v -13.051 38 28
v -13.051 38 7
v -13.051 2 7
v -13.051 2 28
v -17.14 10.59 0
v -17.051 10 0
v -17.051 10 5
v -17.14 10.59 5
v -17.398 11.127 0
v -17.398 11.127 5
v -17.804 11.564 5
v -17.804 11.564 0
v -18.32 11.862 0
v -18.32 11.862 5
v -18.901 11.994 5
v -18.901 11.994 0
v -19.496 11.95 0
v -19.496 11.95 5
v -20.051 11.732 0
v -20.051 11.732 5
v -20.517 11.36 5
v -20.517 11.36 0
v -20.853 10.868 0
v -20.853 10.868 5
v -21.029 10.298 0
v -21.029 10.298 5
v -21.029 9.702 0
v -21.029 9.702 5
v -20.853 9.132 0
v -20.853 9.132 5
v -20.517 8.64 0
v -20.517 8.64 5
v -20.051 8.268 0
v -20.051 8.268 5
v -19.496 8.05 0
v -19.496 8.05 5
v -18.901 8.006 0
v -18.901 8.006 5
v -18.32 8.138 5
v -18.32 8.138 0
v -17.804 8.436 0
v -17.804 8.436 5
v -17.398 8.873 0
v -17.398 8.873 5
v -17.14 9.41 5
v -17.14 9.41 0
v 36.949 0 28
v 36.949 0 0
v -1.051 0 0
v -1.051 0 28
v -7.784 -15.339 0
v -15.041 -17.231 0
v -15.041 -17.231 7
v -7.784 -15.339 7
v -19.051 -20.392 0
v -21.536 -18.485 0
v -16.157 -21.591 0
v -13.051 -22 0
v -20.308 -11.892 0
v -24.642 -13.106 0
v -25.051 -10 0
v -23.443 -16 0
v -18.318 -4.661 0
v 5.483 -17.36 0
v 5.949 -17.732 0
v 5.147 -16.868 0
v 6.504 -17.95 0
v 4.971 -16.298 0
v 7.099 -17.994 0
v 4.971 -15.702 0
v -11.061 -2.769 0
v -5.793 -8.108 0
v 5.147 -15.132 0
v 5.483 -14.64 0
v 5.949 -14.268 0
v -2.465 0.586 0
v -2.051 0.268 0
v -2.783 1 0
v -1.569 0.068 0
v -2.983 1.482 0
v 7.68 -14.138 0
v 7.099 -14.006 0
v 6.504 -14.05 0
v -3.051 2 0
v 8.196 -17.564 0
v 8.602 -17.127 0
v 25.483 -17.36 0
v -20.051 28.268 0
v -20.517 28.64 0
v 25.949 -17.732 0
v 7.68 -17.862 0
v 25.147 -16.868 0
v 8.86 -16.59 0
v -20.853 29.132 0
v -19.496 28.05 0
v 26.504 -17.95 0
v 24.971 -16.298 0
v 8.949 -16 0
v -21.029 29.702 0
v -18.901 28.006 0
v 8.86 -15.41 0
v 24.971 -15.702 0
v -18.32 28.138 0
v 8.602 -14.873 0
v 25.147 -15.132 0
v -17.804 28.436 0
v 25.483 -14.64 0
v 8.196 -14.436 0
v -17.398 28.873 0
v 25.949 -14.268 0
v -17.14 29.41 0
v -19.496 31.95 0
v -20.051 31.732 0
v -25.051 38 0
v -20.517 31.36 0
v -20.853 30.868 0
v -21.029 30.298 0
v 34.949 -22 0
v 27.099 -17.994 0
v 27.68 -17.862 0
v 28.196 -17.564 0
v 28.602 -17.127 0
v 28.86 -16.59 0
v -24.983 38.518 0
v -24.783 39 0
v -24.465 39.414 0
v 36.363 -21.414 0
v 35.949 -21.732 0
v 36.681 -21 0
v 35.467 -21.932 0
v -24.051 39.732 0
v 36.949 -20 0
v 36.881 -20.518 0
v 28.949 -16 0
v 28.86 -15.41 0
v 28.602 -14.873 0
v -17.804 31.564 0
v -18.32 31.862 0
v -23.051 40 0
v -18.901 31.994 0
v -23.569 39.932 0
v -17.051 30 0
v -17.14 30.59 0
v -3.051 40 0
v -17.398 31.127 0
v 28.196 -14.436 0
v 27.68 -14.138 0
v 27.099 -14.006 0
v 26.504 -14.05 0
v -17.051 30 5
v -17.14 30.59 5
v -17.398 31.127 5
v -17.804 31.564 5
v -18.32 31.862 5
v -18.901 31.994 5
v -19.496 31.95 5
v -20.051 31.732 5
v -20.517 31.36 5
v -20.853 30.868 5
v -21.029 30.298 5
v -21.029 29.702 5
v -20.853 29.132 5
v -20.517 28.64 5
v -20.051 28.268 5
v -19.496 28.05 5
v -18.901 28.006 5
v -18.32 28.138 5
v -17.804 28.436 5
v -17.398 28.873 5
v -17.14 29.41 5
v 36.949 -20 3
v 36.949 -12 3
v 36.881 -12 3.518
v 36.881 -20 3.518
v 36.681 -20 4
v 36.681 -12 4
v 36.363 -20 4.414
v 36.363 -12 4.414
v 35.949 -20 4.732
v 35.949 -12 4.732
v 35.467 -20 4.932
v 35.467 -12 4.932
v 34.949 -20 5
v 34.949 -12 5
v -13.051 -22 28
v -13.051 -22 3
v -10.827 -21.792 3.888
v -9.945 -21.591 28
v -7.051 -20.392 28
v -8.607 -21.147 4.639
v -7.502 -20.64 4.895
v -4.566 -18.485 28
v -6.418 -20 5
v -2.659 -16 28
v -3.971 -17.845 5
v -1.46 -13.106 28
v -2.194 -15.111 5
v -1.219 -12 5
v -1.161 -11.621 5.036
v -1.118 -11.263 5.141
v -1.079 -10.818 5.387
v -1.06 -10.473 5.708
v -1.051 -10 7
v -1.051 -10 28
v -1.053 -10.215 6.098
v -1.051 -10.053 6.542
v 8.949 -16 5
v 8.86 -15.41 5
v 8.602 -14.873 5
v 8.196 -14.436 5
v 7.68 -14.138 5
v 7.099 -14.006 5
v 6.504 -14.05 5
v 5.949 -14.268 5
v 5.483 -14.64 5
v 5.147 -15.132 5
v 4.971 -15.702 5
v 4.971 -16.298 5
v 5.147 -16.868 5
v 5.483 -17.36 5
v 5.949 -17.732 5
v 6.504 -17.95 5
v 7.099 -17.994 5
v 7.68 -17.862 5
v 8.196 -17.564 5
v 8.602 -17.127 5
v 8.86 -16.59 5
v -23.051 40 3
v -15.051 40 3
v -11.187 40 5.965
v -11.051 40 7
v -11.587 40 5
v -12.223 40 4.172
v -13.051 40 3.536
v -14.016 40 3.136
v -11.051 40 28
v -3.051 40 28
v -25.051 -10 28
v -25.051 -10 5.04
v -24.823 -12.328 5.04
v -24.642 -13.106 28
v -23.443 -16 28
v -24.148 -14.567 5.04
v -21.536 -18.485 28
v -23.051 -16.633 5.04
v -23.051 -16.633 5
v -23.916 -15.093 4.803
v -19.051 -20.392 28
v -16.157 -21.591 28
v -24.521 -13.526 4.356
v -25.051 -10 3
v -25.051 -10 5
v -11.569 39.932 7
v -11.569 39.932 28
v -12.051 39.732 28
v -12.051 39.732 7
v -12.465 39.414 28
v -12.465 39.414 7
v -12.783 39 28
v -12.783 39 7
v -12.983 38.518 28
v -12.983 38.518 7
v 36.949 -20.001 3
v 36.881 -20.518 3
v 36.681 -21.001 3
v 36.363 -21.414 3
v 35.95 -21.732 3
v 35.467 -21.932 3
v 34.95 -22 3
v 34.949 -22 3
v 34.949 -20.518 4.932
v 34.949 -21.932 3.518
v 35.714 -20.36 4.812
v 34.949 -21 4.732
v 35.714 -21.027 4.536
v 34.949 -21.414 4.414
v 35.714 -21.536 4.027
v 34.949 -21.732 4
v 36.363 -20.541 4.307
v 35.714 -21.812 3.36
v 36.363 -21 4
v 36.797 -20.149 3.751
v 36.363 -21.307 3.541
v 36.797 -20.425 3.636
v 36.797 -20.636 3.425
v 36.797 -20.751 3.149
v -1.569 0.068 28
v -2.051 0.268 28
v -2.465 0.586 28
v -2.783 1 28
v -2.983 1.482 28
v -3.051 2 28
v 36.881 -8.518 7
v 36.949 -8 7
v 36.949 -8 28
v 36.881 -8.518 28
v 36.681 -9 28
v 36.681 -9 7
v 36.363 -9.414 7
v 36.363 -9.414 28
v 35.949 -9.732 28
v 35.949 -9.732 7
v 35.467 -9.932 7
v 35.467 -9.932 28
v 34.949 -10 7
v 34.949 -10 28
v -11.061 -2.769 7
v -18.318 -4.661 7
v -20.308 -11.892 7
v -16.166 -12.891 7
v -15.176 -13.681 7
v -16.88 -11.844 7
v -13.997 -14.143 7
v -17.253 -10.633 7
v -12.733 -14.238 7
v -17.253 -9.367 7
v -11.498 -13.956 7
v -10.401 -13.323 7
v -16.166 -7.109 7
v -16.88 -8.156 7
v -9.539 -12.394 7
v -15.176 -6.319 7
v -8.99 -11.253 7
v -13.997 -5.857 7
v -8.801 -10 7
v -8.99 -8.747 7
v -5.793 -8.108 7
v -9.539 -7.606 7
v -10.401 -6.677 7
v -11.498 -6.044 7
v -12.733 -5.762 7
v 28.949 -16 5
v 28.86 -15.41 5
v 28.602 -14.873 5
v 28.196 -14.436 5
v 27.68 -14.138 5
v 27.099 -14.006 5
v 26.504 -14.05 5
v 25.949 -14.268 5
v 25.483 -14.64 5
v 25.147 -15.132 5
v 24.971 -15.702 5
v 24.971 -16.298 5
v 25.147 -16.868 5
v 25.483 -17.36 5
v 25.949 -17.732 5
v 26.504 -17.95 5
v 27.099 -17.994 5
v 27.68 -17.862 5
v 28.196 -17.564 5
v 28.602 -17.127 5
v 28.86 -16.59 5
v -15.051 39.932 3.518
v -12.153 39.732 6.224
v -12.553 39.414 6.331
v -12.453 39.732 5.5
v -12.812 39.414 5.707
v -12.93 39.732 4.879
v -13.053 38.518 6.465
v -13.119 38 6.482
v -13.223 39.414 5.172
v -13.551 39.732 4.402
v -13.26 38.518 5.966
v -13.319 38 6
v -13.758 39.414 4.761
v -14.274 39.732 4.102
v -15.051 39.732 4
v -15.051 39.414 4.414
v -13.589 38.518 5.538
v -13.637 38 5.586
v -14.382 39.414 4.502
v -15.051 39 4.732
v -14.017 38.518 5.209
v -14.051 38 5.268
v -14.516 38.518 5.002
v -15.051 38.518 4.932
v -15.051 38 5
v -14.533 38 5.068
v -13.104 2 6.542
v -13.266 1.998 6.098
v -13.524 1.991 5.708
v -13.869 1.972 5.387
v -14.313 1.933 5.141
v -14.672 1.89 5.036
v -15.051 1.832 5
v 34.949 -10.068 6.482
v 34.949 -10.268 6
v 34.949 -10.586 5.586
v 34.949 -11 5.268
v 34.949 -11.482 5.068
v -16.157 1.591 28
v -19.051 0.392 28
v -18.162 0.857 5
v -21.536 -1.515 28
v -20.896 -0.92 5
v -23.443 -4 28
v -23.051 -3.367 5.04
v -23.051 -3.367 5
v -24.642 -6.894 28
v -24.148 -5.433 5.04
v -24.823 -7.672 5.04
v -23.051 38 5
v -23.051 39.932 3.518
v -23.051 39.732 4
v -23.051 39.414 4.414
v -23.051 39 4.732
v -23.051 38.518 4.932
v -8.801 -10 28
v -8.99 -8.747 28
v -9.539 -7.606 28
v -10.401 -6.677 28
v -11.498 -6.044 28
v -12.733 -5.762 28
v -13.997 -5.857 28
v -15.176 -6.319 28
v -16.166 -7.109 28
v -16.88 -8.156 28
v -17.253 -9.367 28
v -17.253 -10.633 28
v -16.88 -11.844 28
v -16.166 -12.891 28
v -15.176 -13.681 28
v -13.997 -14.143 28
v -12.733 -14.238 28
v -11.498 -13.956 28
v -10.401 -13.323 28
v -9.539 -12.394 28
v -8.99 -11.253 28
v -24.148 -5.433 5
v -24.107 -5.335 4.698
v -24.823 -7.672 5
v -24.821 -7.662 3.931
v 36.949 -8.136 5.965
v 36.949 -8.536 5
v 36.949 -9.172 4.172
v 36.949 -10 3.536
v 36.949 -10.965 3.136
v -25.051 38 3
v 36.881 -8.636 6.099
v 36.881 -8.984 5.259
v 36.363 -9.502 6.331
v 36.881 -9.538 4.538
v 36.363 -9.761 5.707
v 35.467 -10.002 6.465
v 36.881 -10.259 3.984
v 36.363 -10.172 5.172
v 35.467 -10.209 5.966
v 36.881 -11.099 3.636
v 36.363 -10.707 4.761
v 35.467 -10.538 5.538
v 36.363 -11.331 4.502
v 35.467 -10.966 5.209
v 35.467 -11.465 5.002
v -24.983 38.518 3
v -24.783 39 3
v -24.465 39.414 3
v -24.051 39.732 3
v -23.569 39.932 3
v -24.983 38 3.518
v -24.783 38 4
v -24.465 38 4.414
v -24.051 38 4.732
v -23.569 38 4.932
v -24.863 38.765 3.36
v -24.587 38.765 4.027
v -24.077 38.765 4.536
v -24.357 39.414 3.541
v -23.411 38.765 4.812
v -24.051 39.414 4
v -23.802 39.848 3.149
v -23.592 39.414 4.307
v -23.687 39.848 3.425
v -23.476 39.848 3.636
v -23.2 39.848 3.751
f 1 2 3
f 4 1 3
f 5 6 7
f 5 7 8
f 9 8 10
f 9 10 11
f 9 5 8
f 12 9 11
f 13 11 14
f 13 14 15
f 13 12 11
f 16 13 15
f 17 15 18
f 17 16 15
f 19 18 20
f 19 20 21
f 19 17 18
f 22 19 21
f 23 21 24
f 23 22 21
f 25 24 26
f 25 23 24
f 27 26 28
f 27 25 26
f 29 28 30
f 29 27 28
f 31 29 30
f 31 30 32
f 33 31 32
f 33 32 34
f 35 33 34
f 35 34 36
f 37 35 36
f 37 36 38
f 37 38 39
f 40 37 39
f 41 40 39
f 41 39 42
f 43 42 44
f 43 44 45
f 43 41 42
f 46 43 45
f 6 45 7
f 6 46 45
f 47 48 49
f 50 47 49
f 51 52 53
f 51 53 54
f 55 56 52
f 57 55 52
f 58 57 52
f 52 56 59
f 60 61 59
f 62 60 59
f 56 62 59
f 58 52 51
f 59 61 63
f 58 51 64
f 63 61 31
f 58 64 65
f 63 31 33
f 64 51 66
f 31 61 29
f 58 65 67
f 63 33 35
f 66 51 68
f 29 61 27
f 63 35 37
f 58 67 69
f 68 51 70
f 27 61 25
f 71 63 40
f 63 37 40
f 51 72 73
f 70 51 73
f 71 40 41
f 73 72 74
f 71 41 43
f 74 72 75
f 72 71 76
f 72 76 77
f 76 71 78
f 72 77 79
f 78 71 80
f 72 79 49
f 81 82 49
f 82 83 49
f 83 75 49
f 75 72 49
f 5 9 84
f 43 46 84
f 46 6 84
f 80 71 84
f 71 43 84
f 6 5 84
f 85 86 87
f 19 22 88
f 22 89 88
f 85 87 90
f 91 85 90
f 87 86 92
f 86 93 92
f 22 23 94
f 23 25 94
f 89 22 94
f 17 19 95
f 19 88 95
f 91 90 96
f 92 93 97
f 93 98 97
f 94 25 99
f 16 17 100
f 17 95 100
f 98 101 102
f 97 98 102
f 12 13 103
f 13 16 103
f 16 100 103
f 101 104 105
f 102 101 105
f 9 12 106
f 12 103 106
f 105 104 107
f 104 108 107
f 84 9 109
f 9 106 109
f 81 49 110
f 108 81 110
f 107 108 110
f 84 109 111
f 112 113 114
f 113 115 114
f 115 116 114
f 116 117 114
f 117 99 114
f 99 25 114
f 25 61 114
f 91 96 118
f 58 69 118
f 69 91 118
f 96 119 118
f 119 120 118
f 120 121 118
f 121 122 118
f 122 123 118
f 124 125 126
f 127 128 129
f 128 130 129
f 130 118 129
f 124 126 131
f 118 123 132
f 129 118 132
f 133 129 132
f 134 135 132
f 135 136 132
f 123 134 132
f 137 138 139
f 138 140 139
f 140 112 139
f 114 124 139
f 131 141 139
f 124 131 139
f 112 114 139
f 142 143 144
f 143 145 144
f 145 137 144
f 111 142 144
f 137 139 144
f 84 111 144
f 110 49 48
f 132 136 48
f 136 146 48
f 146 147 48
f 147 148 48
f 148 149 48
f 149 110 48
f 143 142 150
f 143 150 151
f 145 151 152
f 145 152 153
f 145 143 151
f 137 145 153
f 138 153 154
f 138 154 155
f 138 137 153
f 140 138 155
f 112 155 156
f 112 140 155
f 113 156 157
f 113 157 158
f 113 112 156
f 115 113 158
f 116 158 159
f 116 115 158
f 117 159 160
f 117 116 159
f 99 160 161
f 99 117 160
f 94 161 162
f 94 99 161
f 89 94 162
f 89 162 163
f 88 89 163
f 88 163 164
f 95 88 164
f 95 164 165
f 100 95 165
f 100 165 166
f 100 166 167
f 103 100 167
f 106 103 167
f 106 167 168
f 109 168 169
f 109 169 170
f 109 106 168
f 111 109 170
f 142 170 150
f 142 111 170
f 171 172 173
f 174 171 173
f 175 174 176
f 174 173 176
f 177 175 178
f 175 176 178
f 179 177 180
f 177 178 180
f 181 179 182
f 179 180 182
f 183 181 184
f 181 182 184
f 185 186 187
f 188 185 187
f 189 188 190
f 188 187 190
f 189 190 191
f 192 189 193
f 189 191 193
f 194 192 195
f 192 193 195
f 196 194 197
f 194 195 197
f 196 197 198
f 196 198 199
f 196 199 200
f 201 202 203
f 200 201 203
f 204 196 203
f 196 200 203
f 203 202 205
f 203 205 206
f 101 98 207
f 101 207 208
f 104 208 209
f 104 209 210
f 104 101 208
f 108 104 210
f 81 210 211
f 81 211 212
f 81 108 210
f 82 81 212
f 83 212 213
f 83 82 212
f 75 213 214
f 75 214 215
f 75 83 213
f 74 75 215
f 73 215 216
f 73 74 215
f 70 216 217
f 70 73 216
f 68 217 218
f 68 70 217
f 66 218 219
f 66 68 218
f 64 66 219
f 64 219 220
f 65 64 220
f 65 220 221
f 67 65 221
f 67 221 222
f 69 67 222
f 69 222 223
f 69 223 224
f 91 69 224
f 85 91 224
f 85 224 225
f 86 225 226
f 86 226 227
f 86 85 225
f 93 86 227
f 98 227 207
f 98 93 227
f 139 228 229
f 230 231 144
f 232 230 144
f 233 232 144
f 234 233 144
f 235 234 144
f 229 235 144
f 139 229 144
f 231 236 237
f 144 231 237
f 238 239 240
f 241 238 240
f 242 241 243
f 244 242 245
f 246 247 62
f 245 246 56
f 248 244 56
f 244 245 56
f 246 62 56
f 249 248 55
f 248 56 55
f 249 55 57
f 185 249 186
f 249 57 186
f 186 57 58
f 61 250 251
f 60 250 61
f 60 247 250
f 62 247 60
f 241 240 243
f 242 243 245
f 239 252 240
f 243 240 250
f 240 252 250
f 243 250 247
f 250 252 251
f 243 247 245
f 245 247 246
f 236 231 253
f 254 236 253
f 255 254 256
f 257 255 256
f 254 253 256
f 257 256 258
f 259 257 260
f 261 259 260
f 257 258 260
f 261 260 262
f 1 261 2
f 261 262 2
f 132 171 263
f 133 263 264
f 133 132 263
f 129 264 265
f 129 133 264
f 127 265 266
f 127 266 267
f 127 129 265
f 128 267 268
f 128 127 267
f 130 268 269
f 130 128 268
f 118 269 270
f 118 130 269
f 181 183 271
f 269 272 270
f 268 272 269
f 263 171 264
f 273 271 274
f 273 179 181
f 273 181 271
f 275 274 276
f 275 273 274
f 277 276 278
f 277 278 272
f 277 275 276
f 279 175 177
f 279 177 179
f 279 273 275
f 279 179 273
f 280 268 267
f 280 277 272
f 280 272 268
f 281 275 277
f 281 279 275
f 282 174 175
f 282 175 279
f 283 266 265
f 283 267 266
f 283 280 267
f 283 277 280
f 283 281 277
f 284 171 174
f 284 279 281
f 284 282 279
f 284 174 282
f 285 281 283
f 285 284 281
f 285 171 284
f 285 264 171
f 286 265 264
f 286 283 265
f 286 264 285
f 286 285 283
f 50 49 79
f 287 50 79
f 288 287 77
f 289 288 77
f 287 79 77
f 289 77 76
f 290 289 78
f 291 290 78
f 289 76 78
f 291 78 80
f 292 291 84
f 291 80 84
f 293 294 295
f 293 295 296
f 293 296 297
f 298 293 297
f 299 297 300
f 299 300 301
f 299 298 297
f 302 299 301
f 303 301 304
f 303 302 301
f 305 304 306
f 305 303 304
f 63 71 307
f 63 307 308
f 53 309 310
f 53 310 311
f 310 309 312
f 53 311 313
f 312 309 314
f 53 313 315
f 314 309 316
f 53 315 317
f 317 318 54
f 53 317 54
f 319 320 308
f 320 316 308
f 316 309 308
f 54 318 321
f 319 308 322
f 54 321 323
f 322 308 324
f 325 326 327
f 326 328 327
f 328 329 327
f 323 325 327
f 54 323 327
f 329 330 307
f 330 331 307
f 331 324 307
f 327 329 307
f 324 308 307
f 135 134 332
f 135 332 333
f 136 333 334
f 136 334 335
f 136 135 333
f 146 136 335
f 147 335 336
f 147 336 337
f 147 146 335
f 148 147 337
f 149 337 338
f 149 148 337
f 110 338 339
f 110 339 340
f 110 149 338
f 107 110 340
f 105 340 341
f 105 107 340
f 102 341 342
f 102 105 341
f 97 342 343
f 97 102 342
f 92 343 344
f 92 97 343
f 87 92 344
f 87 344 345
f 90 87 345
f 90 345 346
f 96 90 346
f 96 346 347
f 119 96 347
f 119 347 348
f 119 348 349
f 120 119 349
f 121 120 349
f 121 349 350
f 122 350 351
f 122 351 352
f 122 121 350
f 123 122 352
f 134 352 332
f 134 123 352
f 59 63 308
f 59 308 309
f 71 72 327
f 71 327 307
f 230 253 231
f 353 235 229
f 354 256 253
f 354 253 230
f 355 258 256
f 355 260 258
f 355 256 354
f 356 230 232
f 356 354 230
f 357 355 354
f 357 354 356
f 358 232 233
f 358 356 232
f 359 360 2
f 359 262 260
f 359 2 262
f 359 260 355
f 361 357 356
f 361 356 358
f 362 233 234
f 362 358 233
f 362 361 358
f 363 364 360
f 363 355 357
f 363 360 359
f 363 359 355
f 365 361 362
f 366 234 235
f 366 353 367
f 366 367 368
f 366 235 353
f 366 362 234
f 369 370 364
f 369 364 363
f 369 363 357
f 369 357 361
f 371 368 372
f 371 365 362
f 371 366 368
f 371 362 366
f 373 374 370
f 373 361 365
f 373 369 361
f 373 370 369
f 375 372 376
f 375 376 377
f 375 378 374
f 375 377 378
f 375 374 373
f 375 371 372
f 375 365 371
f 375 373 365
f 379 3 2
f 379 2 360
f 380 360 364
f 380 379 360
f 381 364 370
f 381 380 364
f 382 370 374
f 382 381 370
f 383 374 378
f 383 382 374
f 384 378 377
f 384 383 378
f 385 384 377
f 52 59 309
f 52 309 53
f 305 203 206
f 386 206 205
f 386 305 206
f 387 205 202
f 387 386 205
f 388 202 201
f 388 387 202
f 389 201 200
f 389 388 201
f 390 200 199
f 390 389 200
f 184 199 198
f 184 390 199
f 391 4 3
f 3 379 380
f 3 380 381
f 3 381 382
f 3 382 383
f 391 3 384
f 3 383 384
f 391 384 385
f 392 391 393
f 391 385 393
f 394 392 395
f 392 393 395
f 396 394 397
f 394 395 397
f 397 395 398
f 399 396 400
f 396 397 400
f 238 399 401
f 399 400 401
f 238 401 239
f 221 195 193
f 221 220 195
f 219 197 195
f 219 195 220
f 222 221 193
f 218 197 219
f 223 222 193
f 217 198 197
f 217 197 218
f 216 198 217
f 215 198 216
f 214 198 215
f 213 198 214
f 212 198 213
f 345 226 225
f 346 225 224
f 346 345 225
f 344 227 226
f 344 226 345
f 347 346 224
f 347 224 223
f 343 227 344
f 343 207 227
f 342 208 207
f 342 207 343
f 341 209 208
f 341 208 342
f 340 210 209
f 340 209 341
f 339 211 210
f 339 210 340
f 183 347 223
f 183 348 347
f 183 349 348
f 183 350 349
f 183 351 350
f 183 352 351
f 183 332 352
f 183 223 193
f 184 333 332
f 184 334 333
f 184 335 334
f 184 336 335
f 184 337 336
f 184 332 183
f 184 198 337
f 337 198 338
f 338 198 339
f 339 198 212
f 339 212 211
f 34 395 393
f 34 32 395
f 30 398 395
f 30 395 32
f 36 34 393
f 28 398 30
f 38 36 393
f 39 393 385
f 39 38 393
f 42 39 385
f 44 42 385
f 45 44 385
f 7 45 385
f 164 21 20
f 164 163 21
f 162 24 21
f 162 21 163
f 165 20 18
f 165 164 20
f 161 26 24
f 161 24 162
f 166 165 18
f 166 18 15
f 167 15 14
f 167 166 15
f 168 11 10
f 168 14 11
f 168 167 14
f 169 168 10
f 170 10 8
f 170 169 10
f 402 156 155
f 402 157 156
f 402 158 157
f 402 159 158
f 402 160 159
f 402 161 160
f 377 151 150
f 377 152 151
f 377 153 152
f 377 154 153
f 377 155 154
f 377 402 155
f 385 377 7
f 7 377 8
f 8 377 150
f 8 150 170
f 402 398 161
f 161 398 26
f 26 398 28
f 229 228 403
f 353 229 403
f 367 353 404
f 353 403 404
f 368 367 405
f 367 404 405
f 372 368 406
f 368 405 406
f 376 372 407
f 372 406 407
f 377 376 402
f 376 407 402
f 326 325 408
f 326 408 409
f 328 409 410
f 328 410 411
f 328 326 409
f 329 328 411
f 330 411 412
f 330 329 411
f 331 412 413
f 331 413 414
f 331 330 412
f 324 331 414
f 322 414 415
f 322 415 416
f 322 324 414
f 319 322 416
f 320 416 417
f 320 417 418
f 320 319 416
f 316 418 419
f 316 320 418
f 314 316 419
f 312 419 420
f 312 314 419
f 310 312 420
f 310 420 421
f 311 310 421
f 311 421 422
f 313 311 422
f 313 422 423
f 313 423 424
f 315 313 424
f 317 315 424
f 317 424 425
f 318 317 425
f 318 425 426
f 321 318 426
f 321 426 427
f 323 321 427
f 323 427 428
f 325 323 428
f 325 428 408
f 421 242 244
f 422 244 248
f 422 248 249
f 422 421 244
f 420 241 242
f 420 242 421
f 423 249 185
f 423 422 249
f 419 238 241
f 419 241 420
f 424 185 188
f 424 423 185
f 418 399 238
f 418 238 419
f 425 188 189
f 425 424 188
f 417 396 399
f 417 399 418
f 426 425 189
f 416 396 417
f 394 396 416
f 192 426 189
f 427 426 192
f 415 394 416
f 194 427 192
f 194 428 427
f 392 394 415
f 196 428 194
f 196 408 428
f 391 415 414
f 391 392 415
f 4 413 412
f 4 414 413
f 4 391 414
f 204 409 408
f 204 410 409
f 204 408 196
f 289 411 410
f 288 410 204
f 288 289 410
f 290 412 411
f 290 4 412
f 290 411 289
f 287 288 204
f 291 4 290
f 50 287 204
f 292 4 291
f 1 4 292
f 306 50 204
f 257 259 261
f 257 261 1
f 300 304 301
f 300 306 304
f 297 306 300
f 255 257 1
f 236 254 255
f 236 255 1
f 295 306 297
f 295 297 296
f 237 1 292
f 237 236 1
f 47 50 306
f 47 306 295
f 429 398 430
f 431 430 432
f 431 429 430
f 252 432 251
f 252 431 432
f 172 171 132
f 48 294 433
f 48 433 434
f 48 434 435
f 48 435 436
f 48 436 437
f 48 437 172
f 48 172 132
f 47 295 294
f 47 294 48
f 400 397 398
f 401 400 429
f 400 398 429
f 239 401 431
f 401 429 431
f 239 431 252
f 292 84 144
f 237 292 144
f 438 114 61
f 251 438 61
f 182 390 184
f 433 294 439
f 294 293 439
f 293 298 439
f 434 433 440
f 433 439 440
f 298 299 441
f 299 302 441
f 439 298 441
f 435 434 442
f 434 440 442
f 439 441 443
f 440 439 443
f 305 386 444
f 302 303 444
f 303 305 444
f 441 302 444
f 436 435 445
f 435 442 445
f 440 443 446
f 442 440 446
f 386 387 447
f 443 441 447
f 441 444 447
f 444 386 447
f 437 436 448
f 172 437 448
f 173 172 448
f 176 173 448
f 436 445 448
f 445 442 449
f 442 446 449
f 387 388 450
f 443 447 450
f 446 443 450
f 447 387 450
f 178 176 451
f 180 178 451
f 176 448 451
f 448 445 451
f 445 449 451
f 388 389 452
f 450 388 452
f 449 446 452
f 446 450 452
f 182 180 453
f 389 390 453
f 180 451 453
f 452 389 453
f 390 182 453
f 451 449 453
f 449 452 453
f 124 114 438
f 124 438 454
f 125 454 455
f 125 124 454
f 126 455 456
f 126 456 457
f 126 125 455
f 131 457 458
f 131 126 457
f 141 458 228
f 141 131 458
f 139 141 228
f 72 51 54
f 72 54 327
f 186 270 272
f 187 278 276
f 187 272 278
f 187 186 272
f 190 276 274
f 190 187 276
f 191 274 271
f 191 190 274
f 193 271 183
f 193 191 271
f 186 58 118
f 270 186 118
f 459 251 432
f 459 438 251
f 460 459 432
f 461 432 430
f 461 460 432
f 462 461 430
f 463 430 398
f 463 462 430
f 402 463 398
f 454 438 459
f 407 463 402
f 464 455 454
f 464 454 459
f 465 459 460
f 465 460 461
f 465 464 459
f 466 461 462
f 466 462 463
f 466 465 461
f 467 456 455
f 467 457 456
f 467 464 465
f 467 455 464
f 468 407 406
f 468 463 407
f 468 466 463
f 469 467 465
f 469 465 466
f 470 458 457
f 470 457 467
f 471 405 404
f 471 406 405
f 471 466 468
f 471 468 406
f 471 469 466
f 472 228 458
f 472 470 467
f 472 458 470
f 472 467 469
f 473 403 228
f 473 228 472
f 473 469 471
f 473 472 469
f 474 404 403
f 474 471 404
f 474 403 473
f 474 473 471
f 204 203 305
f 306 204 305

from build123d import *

# Parameters (mm, degrees)
F1_DEPTH     = 28
F0_R         = 2
F2_DEPTH     = 5
F3_DEPTH     = 5
F0_R_2       = 4.25
F4_DEPTH     = 28
F5_DEPTH     = 7
F6_T1_DEPTH  = 28
F6_T6_DEPTH  = 43
F6_S7_R      = 12
F6_T8_DEPTH  = 23
F6_T12_DEPTH = 43
F6_S13_R     = 12
F6_T14_DEPTH = 23
F6_T15_DEPTH = 5
F6_T20_DEPTH = 58.5
F6_S21_R     = 12
F6_T22_DEPTH = 31
F6_T26_DEPTH = 58.5
F6_S27_R     = 12
F6_T28_DEPTH = 31
F6_T33_DEPTH = 10
F6_T37_DEPTH = 63.5
F6_T44_DEPTH = 10
F6_T48_DEPTH = 63.5
F6_T51_DEPTH = 21
F6_T53_DEPTH = 8
F6_T55_DEPTH = 8
F6_S59_W     = 2.04
F6_S59_H     = 2.04
F6_T60_DEPTH = 2.04
F6_S65_W     = 2.04
F6_S65_H     = 2.04
F6_T66_DEPTH = 2.04
F6_T70_ANGLE = 90
F6_T72_ANGLE = 90


# Not quite as in the source:
# - a fillet or chamfer that OpenCascade refuses, or shapes differently, is made with other operations: its cross-section is extruded or revolved along the edge and cut away or added


with BuildPart() as f1:
    # F0 (on Top) → F1 (new body)
    with BuildSketch(Plane.XY):
        with BuildLine():
            Line((36.9490647506, 0), (-3.0509352494, 0))
            Line((-3.0509352494, 0), (-3.0509352494, 40))
            Line((-3.0509352494, 40), (-13.0509352494, 40))
            Line((-13.0509352494, 40), (-13.0509352494, 2))
            ThreePointArc((-13.0509352494, 2), (-21.5362166237, -1.5147186258), (-25.0509352494, -10))
            ThreePointArc((-25.0509352494, -10), (-21.5362166237, -18.4852813742), (-13.0509352494, -22))
            ThreePointArc((-13.0509352494, -22), (-4.5656538752, -18.4852813742), (-1.0509352494, -10))
            Line((-1.0509352494, -10), (36.9490647506, -10))
            Line((36.9490647506, -10), (36.9490647506, 0))
        make_face()
        Polygon((-5.7934883103, -8.1080528744), (-7.7837375065, -15.3391598531), (-15.0411844456, -17.2311069787), (-20.3083821886, -11.8919471256), (-18.3181329923, -4.6608401469), (-11.0606860532, -2.7688930213), align=None, mode=Mode.SUBTRACT)
    extrude(amount=F1_DEPTH)

    # F0 (on Top) → F2 (join)
    with BuildSketch(Plane.XY):
        with BuildLine():
            Line((-13.0509352494, 2), (-13.0509352494, 40))
            Line((-13.0509352494, 40), (-25.0509352494, 40))
            Line((-25.0509352494, 40), (-25.0509352494, -10))
            ThreePointArc((-25.0509352494, -10), (-21.5362166237, -1.5147186258), (-13.0509352494, 2))
        make_face()
        with Locations((-19.0509352494, 10)):
            Circle(F0_R, mode=Mode.SUBTRACT)
        with Locations((-19.0509352494, 30)):
            Circle(F0_R, mode=Mode.SUBTRACT)
    extrude(amount=F2_DEPTH)

    # F0 (on Top) → F3 (join)
    with BuildSketch(Plane.XY):
        with BuildLine():
            Line((36.9490647506, -22), (36.9490647506, -10))
            Line((36.9490647506, -10), (-1.0509352494, -10))
            ThreePointArc((-1.0509352494, -10), (-4.5656538752, -18.4852813742), (-13.0509352494, -22))
            Line((-13.0509352494, -22), (36.9490647506, -22))
        make_face()
        with Locations((6.9490647506, -16)):
            Circle(F0_R, mode=Mode.SUBTRACT)
        with Locations((26.9490647506, -16)):
            Circle(F0_R, mode=Mode.SUBTRACT)
    extrude(amount=F3_DEPTH)

    # F0 (on Top) → F4 (join)
    with BuildSketch(Plane.XY):
        Polygon((-15.0411844456, -17.2311069787), (-7.7837375065, -15.3391598531), (-5.7934883103, -8.1080528744), (-11.0606860532, -2.7688930213), (-18.3181329923, -4.6608401469), (-20.3083821886, -11.8919471256), align=None)
        with Locations((-13.0509352494, -10)):
            Circle(F0_R_2, mode=Mode.SUBTRACT)
    extrude(amount=F4_DEPTH)

    # F0 (on Top) → F5 (cut)
    with BuildSketch(Plane.XY):
        Polygon((-15.0411844456, -17.2311069787), (-7.7837375065, -15.3391598531), (-5.7934883103, -8.1080528744), (-11.0606860532, -2.7688930213), (-18.3181329923, -4.6608401469), (-20.3083821886, -11.8919471256), align=None)
        with Locations((-13.0509352494, -10)):
            Circle(F0_R_2, mode=Mode.SUBTRACT)
    extrude(amount=F5_DEPTH, mode=Mode.SUBTRACT)

    # F6: fillet of radius 2 on 11 edges, made by hand

    # F6_s2 → F6_t1 (join)
    with BuildSketch(Plane.XY):
        with BuildLine():
            ThreePointArc((-1.0509352494, 0), (-2.4651488118, 0.5857864376), (-3.0509352494, 2))
            Line((-3.0509352494, 2), (-3.0909352494, 2))
            Line((-3.0909352494, 2), (-3.0909352494, -0.04))
            Line((-3.0909352494, -0.04), (-1.0509352494, -0.04))
            Line((-1.0509352494, -0.04), (-1.0509352494, 0))
        make_face()
    extrude(amount=F6_T1_DEPTH)


with BuildPart() as f6_tool4:
    # F6_s5 → F6_t6 (new body)
    with BuildSketch(Plane.YZ.offset(36.9490647506)):
        with BuildLine():
            ThreePointArc((-10, 7), (-10.5857864376, 5.5857864376), (-12, 5))
            Line((-12, 5), (-12, 4.96))
            Line((-12, 4.96), (-9.96, 4.96))
            Line((-9.96, 4.96), (-9.96, 7))
            Line((-9.96, 7), (-10, 7))
        make_face()
    extrude(amount=-F6_T6_DEPTH)

    # F6_s7 → F6_t8 (cut, symmetric)
    with BuildSketch(Plane.XY.offset(6)):
        with Locations((-13.0509352494, -10)):
            Circle(F6_S7_R)
    extrude(amount=F6_T8_DEPTH, both=True, mode=Mode.SUBTRACT)


with BuildPart() as f1_1:
    add(f1.part)

    # F6_t3: union F6_tool4
    add(f6_tool4.part)


with BuildPart() as f6_tool10:
    # F6_s11 → F6_t12 (new body)
    with BuildSketch(Plane.XZ.offset(3)):
        with BuildLine():
            ThreePointArc((-13.0509352494, 7), (-13.6367216871, 5.5857864376), (-15.0509352494, 5))
            Line((-15.0509352494, 5), (-15.0509352494, 4.96))
            Line((-15.0509352494, 4.96), (-13.0109352494, 4.96))
            Line((-13.0109352494, 4.96), (-13.0109352494, 7))
            Line((-13.0109352494, 7), (-13.0509352494, 7))
        make_face()
    extrude(amount=-F6_T12_DEPTH)

    # F6_s13 → F6_t14 (cut, symmetric)
    with BuildSketch(Plane.XY.offset(6)):
        with Locations((-13.0509352494, -10)):
            Circle(F6_S13_R)
    extrude(amount=F6_T14_DEPTH, both=True, mode=Mode.SUBTRACT)


with BuildPart() as f1_2:
    add(f1_1.part)

    # F6_t9: union F6_tool10
    add(f6_tool10.part)

    # F6_s16 → F6_t15 (cut)
    with BuildSketch(Plane.XY):
        with BuildLine():
            ThreePointArc((36.9490647506, -20), (36.3632783129, -21.4142135624), (34.9490647506, -22))
            Line((34.9490647506, -22), (34.9490647506, -22.04))
            Line((34.9490647506, -22.04), (36.9890647506, -22.04))
            Line((36.9890647506, -22.04), (36.9890647506, -20))
            Line((36.9890647506, -20), (36.9490647506, -20))
        make_face()
        with BuildLine():
            ThreePointArc((-25.0509352494, 38), (-24.4651488118, 39.4142135624), (-23.0509352494, 40))
            Line((-23.0509352494, 40), (-23.0509352494, 40.04))
            Line((-23.0509352494, 40.04), (-25.0909352494, 40.04))
            Line((-25.0909352494, 40.04), (-25.0909352494, 38))
            Line((-25.0909352494, 38), (-25.0509352494, 38))
        make_face()
    extrude(amount=F6_T15_DEPTH, mode=Mode.SUBTRACT)


with BuildPart() as f6_tool18:
    # F6_s19 → F6_t20 (new body)
    with BuildSketch(Plane.YZ.offset(-21.5509352494)):
        with BuildLine():
            ThreePointArc((-22, 3), (-21.4142135624, 4.4142135624), (-20, 5))
            Line((-20, 5), (-20, 5.04))
            Line((-20, 5.04), (-22.04, 5.04))
            Line((-22.04, 5.04), (-22.04, 3))
            Line((-22.04, 3), (-22, 3))
        make_face()
    extrude(amount=F6_T20_DEPTH)

    # F6_s21 → F6_t22 (cut, symmetric)
    with BuildSketch(Plane.XY.offset(4)):
        with Locations((-13.0509352494, -10)):
            Circle(F6_S21_R)
    extrude(amount=F6_T22_DEPTH, both=True, mode=Mode.SUBTRACT)


with BuildPart() as f1_3:
    add(f1_2.part)

    # F6_t17: cut F6_tool18
    add(f6_tool18.part, mode=Mode.SUBTRACT)


with BuildPart() as f6_tool24:
    # F6_s25 → F6_t26 (new body)
    with BuildSketch(Plane.XZ.offset(-40)):
        with BuildLine():
            ThreePointArc((-25.0509352494, 3), (-24.4651488118, 4.4142135624), (-23.0509352494, 5))
            Line((-23.0509352494, 5), (-23.0509352494, 5.04))
            Line((-23.0509352494, 5.04), (-25.0909352494, 5.04))
            Line((-25.0909352494, 5.04), (-25.0909352494, 3))
            Line((-25.0909352494, 3), (-25.0509352494, 3))
        make_face()
    extrude(amount=F6_T26_DEPTH)

    # F6_s27 → F6_t28 (cut, symmetric)
    with BuildSketch(Plane.XY.offset(4)):
        with Locations((-13.0509352494, -10)):
            Circle(F6_S27_R)
    extrude(amount=F6_T28_DEPTH, both=True, mode=Mode.SUBTRACT)


with BuildPart() as f1_4:
    add(f1_3.part)

    # F6_t23: cut F6_tool24
    add(f6_tool24.part, mode=Mode.SUBTRACT)


with BuildPart() as f6_tool31:
    # F6_s32 → F6_t33 (new body)
    with BuildSketch(Plane.XY):
        with BuildLine():
            ThreePointArc((36.9490647506, -20), (36.3632783129, -21.4142135624), (34.9490647506, -22))
            Line((34.9490647506, -22), (34.9490647506, -22.04))
            Line((34.9490647506, -22.04), (36.9890647506, -22.04))
            Line((36.9890647506, -22.04), (36.9890647506, -20))
            Line((36.9890647506, -20), (36.9490647506, -20))
        make_face()
    extrude(amount=F6_T33_DEPTH)

    split(bisect_by=Plane.XY.offset(5), keep=Keep.TOP)


with BuildPart() as f6_tool35:
    # F6_s36 → F6_t37 (new body)
    with BuildSketch(Plane.YZ.offset(-21.5509352494)):
        with BuildLine():
            ThreePointArc((-22, 3), (-21.4142135624, 4.4142135624), (-20, 5))
            Line((-20, 5), (-20, 5.04))
            Line((-20, 5.04), (-22.04, 5.04))
            Line((-22.04, 5.04), (-22.04, 3))
            Line((-22.04, 3), (-22, 3))
        make_face()
    extrude(amount=F6_T37_DEPTH)

    split(bisect_by=Plane.YZ.offset(36.9490647506), keep=Keep.TOP)


with BuildPart() as f6_tool31_1:
    add(f6_tool31.part)

    # F6_t39: intersect F6_tool35
    add(f6_tool35.part, mode=Mode.INTERSECT)


with BuildPart() as f1_5:
    add(f1_4.part)

    # F6_t29: cut F6_tool31
    add(f6_tool31_1.part, mode=Mode.SUBTRACT)


with BuildPart() as f6_tool42:
    # F6_s43 → F6_t44 (new body)
    with BuildSketch(Plane.XY):
        with BuildLine():
            ThreePointArc((-25.0509352494, 38), (-24.4651488118, 39.4142135624), (-23.0509352494, 40))
            Line((-23.0509352494, 40), (-23.0509352494, 40.04))
            Line((-23.0509352494, 40.04), (-25.0909352494, 40.04))
            Line((-25.0909352494, 40.04), (-25.0909352494, 38))
            Line((-25.0909352494, 38), (-25.0509352494, 38))
        make_face()
    extrude(amount=F6_T44_DEPTH)

    split(bisect_by=Plane.XY.offset(5), keep=Keep.TOP)


with BuildPart() as f6_tool46:
    # F6_s47 → F6_t48 (new body)
    with BuildSketch(Plane.XZ.offset(-45)):
        with BuildLine():
            ThreePointArc((-25.0509352494, 3), (-24.4651488118, 4.4142135624), (-23.0509352494, 5))
            Line((-23.0509352494, 5), (-23.0509352494, 5.04))
            Line((-23.0509352494, 5.04), (-25.0909352494, 5.04))
            Line((-25.0909352494, 5.04), (-25.0909352494, 3))
            Line((-25.0909352494, 3), (-25.0509352494, 3))
        make_face()
    extrude(amount=F6_T48_DEPTH)

    split(bisect_by=Plane.XZ.offset(-40), keep=Keep.BOTTOM)


with BuildPart() as f6_tool42_1:
    add(f6_tool42.part)

    # F6_t50: intersect F6_tool46
    add(f6_tool46.part, mode=Mode.INTERSECT)


with BuildPart() as f1_6:
    add(f1_5.part)

    # F6_t40: cut F6_tool42
    add(f6_tool42_1.part, mode=Mode.SUBTRACT)

    # F6_s52 → F6_t51 (cut)
    with BuildSketch(Plane.XY.offset(7)):
        with BuildLine():
            ThreePointArc((36.9490647506, -8), (36.3632783129, -9.4142135624), (34.9490647506, -10))
            Line((34.9490647506, -10), (34.9490647506, -10.04))
            Line((34.9490647506, -10.04), (36.9890647506, -10.04))
            Line((36.9890647506, -10.04), (36.9890647506, -8))
            Line((36.9890647506, -8), (36.9490647506, -8))
        make_face()
        with BuildLine():
            ThreePointArc((-11.0509352494, 40), (-12.4651488118, 39.4142135624), (-13.0509352494, 38))
            Line((-13.0509352494, 38), (-13.0909352494, 38))
            Line((-13.0909352494, 38), (-13.0909352494, 40.04))
            Line((-13.0909352494, 40.04), (-11.0509352494, 40.04))
            Line((-11.0509352494, 40.04), (-11.0509352494, 40))
        make_face()
    extrude(amount=F6_T51_DEPTH, mode=Mode.SUBTRACT)

    # F6_s54 → F6_t53 (cut)
    with BuildSketch(Plane.XZ.offset(12)):
        with BuildLine():
            ThreePointArc((36.9490647506, 3), (36.3632783129, 4.4142135624), (34.9490647506, 5))
            Line((34.9490647506, 5), (34.9490647506, 5.04))
            Line((34.9490647506, 5.04), (36.9890647506, 5.04))
            Line((36.9890647506, 5.04), (36.9890647506, 3))
            Line((36.9890647506, 3), (36.9490647506, 3))
        make_face()
    extrude(amount=F6_T53_DEPTH, mode=Mode.SUBTRACT)

    # F6_s56 → F6_t55 (cut)
    with BuildSketch(Plane.YZ.offset(-23.0509352494)):
        with BuildLine():
            ThreePointArc((40, 3), (39.4142135624, 4.4142135624), (38, 5))
            Line((38, 5), (38, 5.04))
            Line((38, 5.04), (40.04, 5.04))
            Line((40.04, 5.04), (40.04, 3))
            Line((40.04, 3), (40, 3))
        make_face()
    extrude(amount=F6_T55_DEPTH, mode=Mode.SUBTRACT)


with BuildPart() as f6_tool58:
    # F6_s59 → F6_t60 (new body)
    with BuildSketch(Plane.XZ.offset(-38)):
        with Locations((-24.0709352494, 4.02)):
            Rectangle(F6_S59_W, F6_S59_H)
    extrude(amount=-F6_T60_DEPTH)

    # F6_s61 → F6_t62 (revolve, cut)
    with BuildSketch(Plane(origin=(-23.0509352494, 38, 3), x_dir=(0.7071067812, 0, -0.7071067812), z_dir=(0.7071067812, 0, 0.7071067812))):
        with BuildLine():
            ThreePointArc((0, -2), (2, 0), (0, 2))
            Line((0, 2), (0, -2))
        make_face()
    revolve(axis=Axis((-23.0509352494, 38, 3), (0, 1, 0)), mode=Mode.SUBTRACT)


with BuildPart() as f1_7:
    add(f1_6.part)

    # F6_t57: cut F6_tool58
    add(f6_tool58.part, mode=Mode.SUBTRACT)


with BuildPart() as f6_tool64:
    # F6_s65 → F6_t66 (new body)
    with BuildSketch(Plane.YZ.offset(34.9490647506)):
        with Locations((-21.02, 4.02)):
            Rectangle(F6_S65_W, F6_S65_H)
    extrude(amount=F6_T66_DEPTH)

    # F6_s67 → F6_t68 (revolve, cut)
    with BuildSketch(Plane(origin=(34.9490647506, -20, 3), x_dir=(0, 0.7071067812, -0.7071067812), z_dir=(0, -0.7071067812, -0.7071067812))):
        with BuildLine():
            ThreePointArc((0, -2), (2, 0), (0, 2))
            Line((0, 2), (0, -2))
        make_face()
    revolve(axis=Axis((34.9490647506, -20, 3), (1, 0, 0)), mode=Mode.SUBTRACT)


with BuildPart() as f1_8:
    add(f1_7.part)

    # F6_t63: cut F6_tool64
    add(f6_tool64.part, mode=Mode.SUBTRACT)

    # F6_s69 → F6_t70 (revolve, cut)
    with BuildSketch(Plane.XY.offset(7)):
        with BuildLine():
            ThreePointArc((-11.0509352494, 40), (-12.4651488118, 39.4142135624), (-13.0509352494, 38))
            Line((-13.0509352494, 38), (-13.0909352494, 38))
            Line((-13.0909352494, 38), (-13.0909352494, 40.04))
            Line((-13.0909352494, 40.04), (-11.0509352494, 40.04))
            Line((-11.0509352494, 40.04), (-11.0509352494, 40))
        make_face()
    revolve(axis=Axis((-15.0509352494, 40, 7), (0, 1, 0)), revolution_arc=F6_T70_ANGLE, mode=Mode.SUBTRACT)

    # F6_s71 → F6_t72 (revolve, cut)
    with BuildSketch(Plane.XY.offset(7)):
        with BuildLine():
            ThreePointArc((36.9490647506, -8), (36.3632783129, -9.4142135624), (34.9490647506, -10))
            Line((34.9490647506, -10), (34.9490647506, -10.04))
            Line((34.9490647506, -10.04), (36.9890647506, -10.04))
            Line((36.9890647506, -10.04), (36.9890647506, -8))
            Line((36.9890647506, -8), (36.9490647506, -8))
        make_face()
    revolve(axis=Axis((36.9490647506, -12, 7), (-1, 0, 0)), revolution_arc=F6_T72_ANGLE, mode=Mode.SUBTRACT)


solid = f1_8.part
